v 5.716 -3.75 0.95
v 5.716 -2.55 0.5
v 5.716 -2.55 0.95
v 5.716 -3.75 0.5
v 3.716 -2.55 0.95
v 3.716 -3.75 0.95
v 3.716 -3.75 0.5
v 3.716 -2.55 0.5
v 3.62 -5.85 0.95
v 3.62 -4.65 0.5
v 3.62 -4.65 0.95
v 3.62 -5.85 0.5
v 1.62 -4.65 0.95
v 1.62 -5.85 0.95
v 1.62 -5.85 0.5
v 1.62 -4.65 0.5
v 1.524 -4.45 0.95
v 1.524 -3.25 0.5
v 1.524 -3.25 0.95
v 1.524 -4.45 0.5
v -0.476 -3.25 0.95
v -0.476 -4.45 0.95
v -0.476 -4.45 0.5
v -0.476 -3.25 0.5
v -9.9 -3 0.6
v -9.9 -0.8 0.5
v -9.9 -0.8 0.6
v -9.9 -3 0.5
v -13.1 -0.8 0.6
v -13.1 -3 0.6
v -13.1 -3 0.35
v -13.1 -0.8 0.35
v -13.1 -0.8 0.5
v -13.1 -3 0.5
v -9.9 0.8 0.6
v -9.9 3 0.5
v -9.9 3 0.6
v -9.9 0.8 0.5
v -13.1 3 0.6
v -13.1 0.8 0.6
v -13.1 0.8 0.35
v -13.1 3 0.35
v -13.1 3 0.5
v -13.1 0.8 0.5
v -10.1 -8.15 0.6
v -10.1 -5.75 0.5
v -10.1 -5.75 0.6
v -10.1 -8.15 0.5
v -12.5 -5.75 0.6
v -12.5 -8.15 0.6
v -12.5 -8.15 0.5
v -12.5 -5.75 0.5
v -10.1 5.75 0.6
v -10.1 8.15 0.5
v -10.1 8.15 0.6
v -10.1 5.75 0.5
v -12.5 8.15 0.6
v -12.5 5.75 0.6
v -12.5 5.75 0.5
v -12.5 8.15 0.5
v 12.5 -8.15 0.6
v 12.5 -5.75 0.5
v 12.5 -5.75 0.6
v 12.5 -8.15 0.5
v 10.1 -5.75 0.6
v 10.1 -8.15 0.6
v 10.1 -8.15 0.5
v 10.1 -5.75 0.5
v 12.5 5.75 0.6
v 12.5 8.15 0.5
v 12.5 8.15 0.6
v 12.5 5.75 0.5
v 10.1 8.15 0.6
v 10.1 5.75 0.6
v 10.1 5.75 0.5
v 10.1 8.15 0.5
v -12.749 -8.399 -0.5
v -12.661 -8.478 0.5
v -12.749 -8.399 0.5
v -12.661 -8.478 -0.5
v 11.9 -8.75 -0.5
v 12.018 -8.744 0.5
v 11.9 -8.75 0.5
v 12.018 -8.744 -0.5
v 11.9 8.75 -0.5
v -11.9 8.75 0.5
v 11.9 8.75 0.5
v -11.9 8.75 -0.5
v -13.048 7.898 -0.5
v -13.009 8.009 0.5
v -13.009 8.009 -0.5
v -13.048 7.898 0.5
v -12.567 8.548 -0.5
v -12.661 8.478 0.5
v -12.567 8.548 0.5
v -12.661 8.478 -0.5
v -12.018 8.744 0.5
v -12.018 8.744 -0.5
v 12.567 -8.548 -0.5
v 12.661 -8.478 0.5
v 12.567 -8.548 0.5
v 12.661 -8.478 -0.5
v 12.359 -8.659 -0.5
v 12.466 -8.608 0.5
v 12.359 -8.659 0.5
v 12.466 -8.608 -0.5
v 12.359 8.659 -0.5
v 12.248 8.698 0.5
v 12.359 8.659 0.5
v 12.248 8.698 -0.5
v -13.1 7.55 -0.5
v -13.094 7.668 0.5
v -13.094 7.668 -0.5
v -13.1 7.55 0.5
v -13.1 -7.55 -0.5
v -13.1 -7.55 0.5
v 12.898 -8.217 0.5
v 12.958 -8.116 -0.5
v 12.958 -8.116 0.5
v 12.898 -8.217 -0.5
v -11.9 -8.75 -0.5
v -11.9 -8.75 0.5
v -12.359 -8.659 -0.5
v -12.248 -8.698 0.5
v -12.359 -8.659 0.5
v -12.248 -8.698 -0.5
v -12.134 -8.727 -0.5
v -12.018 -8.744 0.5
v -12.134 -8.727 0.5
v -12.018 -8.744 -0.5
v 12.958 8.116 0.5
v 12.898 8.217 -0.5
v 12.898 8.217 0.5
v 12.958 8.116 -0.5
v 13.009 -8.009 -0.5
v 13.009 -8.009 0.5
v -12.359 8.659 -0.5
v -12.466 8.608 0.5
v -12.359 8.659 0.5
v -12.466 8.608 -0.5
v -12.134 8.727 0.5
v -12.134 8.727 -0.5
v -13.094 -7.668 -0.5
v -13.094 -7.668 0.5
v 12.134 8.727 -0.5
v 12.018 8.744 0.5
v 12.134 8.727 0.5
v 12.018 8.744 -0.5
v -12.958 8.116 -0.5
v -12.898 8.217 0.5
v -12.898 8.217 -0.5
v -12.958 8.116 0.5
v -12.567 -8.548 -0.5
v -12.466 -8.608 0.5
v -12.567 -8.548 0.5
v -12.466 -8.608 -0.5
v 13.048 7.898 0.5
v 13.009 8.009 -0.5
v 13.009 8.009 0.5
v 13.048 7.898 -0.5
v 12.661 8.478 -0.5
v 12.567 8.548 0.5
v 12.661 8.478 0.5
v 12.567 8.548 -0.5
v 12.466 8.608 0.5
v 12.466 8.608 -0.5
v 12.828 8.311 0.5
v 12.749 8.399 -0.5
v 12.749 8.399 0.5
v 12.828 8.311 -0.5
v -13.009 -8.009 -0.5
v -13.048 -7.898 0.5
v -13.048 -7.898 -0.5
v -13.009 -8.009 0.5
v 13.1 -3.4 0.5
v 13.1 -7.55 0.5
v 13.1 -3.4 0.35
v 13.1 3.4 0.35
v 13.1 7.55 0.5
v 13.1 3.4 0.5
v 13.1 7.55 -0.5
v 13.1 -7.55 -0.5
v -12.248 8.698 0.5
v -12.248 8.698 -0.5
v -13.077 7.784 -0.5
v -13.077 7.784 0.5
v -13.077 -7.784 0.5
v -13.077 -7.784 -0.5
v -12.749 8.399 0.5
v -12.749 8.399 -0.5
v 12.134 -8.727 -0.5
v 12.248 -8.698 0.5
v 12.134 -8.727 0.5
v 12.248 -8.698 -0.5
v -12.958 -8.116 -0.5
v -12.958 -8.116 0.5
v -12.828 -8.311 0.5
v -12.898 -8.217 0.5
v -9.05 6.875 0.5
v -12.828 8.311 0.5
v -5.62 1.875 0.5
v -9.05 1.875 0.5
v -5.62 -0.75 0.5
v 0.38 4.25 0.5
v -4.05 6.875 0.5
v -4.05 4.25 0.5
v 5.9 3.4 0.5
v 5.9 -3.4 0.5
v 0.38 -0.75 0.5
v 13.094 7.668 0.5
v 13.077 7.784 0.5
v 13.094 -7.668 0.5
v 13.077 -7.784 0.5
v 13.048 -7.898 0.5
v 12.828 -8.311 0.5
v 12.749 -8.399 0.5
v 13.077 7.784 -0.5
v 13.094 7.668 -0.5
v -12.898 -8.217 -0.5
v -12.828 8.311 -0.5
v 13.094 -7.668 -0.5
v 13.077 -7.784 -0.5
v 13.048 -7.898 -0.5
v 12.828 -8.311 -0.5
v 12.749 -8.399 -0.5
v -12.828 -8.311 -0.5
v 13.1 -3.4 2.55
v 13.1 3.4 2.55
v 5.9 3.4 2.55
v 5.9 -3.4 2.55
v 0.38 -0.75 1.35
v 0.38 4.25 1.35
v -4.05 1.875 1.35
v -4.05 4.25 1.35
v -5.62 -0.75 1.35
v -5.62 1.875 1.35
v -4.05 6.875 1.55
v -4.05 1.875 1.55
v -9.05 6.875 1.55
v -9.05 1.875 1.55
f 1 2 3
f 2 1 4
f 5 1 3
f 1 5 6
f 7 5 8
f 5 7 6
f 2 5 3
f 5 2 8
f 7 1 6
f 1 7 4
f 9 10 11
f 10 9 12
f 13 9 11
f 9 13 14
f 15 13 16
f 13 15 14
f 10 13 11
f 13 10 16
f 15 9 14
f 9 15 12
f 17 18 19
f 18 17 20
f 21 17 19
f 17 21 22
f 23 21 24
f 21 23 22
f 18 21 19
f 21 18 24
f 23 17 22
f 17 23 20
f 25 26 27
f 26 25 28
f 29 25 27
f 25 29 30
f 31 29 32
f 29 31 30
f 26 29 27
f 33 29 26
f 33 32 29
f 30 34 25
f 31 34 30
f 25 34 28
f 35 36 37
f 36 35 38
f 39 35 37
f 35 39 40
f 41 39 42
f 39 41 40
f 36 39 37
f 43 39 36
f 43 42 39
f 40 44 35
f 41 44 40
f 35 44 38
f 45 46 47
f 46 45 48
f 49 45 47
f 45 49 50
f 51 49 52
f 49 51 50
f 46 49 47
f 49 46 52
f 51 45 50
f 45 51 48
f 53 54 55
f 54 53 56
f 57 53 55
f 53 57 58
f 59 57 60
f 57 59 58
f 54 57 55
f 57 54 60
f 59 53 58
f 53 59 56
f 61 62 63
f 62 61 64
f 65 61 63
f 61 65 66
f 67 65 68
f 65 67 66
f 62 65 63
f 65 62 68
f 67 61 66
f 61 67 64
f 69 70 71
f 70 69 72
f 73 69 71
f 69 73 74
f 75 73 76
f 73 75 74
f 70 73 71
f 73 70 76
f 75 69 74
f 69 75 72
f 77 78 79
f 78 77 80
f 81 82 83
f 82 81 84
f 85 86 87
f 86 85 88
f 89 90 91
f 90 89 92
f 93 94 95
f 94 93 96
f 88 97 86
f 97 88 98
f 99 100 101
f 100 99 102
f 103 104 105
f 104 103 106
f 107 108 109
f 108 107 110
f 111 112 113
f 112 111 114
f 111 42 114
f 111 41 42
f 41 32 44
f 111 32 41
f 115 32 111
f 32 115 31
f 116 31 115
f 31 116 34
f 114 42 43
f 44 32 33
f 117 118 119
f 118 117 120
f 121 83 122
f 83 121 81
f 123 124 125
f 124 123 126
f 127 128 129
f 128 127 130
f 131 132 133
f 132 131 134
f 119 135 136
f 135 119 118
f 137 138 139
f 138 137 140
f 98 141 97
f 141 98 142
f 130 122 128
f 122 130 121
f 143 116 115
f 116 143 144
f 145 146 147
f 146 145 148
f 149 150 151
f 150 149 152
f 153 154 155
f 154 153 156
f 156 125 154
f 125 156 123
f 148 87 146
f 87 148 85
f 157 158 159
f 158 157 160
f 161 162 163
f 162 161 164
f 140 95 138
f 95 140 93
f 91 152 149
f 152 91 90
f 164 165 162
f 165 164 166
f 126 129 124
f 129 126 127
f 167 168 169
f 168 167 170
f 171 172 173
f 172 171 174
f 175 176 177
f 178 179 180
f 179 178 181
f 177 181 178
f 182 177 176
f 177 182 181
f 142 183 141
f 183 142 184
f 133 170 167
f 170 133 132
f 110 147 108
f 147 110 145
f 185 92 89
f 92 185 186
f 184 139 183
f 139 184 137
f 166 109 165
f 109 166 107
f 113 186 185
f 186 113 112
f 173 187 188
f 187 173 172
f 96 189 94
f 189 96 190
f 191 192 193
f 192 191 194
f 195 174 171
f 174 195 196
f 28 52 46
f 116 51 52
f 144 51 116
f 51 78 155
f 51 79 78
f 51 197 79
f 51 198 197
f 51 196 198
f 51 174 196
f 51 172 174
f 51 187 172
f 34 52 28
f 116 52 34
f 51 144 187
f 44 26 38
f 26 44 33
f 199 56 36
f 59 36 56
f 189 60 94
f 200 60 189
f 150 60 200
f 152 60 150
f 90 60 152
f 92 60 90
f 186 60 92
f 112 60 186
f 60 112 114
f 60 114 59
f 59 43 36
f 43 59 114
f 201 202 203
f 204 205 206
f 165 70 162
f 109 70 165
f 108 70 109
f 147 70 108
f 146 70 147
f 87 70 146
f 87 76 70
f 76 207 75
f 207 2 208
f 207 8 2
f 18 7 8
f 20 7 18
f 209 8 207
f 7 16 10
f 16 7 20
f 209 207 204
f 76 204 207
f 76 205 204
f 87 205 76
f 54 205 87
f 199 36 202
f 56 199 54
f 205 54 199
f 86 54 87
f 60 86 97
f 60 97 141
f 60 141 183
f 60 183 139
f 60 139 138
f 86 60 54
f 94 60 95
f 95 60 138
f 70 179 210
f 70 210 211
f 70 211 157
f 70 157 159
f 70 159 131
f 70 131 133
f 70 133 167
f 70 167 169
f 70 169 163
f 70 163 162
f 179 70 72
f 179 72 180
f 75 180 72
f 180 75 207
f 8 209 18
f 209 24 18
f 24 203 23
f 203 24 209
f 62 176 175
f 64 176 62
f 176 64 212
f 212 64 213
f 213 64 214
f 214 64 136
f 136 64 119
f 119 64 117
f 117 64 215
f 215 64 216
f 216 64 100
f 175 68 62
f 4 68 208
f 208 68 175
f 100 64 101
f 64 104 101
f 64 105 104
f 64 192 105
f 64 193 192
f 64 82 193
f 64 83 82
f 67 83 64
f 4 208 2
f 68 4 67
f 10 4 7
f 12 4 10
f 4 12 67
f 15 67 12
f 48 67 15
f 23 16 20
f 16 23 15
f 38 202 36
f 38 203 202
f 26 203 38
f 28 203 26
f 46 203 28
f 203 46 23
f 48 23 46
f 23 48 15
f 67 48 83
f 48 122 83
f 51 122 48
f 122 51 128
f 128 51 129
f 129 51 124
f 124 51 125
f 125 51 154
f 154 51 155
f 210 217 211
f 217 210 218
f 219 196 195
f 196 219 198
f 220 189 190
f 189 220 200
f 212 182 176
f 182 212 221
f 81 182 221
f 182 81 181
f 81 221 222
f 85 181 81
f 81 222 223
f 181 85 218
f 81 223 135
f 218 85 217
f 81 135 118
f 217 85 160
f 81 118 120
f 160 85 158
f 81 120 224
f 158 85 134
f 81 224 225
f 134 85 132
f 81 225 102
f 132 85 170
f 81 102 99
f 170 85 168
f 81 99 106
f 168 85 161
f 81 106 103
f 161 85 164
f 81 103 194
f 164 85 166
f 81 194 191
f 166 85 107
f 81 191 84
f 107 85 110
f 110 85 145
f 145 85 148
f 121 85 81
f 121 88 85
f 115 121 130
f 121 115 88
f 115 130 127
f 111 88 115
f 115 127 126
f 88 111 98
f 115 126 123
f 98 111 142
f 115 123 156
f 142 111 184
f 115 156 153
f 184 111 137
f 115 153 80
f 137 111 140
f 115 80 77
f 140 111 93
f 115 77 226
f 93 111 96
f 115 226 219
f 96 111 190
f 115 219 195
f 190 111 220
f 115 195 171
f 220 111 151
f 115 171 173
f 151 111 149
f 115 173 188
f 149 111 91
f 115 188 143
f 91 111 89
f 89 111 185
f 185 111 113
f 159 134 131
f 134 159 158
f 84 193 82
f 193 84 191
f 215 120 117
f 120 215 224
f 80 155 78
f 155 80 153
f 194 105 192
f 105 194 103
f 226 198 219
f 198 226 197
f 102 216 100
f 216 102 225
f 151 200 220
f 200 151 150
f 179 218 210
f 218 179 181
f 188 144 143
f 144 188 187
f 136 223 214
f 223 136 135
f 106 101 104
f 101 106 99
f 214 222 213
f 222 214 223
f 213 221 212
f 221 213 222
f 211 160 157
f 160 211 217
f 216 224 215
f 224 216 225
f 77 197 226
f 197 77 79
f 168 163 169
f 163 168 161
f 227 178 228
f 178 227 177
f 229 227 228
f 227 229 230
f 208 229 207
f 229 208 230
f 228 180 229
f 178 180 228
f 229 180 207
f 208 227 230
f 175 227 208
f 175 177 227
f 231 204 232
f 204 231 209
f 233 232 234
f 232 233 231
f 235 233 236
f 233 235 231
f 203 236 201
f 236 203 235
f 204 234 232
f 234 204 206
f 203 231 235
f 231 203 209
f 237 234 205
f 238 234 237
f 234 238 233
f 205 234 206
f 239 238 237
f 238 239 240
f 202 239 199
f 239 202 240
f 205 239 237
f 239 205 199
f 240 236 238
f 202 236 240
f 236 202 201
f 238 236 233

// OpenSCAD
$fn = 64;

// Battery charger module overall: 26.2 x 17.5 x 1.0 mm (PCB thickness)
// Keep ONE connected solid. All features overlap into PCB by 'ov'.
// PCB is centered at origin, spanning Z = [-pcb_t/2, +pcb_t/2].

module battery_charger_module() {
    // --- Primary dimensions ---
    pcb_l = 26.2;
    pcb_w = 17.5;
    pcb_t = 1.0;

    // Corner radius for PCB outline
    pcb_r = 1.2;

    // Small overlap to guarantee connectivity between features
    ov = 0.15;

    // --- Feature sizes (low-profile) ---
    // USB-like connector block (low profile)
    usb_l = 7.2;
    usb_w = 6.8;
    usb_h = 2.2;

    // IC package
    ic_l = 6.0;
    ic_w = 5.0;
    ic_h = 1.0;

    // Inductor / large component
    ind_l = 5.0;
    ind_w = 5.0;
    ind_h = 1.2;

    // Small passives
    smd_l = 2.0;
    smd_w = 1.2;
    smd_h = 0.6;

    // Pads as raised copper (very thin)
    pad_h = 0.25;

    // --- Helper: rounded rectangle prism (centered) ---
    module rounded_plate(l, w, h, r) {
        linear_extrude(height = h, center = true)
            offset(r = r)
                square([l - 2*r, w - 2*r], center = true);
    }

    union() {
        // PCB centered at origin, thickness exactly 1.0mm
        rounded_plate(pcb_l, pcb_w, pcb_t, pcb_r);

        // Common Z placement for "on top of PCB" features (centered cubes)
        z_top = pcb_t/2 + (0) ; // PCB top surface at +pcb_t/2

        // USB connector on +X short edge, sitting on top of PCB, overlapping into PCB
        translate([
            pcb_l/2 - usb_l/2,                 // flush to right edge
            0,
            z_top + usb_h/2 - ov               // bottom at pcb_t/2 - ov
        ])
            cube([usb_l, usb_w, usb_h], center = true);

        // Main IC near center-left
        translate([
            -pcb_l*0.10,
            pcb_w*0.10,
            z_top + ic_h/2 - ov
        ])
            cube([ic_l, ic_w, ic_h], center = true);

        // Inductor near top-left quadrant
        translate([
            -pcb_l*0.25,
            pcb_w*0.25,
            z_top + ind_h/2 - ov
        ])
            cube([ind_l, ind_w, ind_h], center = true);

        // A few small passives near the USB side
        for (p = [
            [ pcb_l*0.18, -pcb_w*0.18],
            [ pcb_l*0.10, -pcb_w*0.30],
            [ pcb_l*0.02, -pcb_w*0.22]
        ]) {
            translate([p[0], p[1], z_top + smd_h/2 - ov])
                cube([smd_l, smd_w, smd_h], center = true);
        }

        // Battery pads on -X short edge, as thin raised copper, overlapping into PCB
        pad_l = 3.2;
        pad_w = 2.2;
        pad_gap = 1.6;

        for (i = [-1, 1]) {
            translate([
                -pcb_l/2 + pad_l/2,            // flush to left edge
                i*(pad_w/2 + pad_gap/2),
                z_top + pad_h/2 - ov
            ])
                cube([pad_l, pad_w, pad_h], center = true);
        }

        // Four corner mounting pads (thin), overlapping into PCB
        corner_pad = 2.4;
        inset = 1.8;
        for (sx = [-1, 1], sy = [-1, 1]) {
            translate([
                sx*(pcb_l/2 - inset),
                sy*(pcb_w/2 - inset),
                z_top + pad_h/2 - ov
            ])
                cube([corner_pad, corner_pad, pad_h], center = true);
        }
    }
}

battery_charger_module();
